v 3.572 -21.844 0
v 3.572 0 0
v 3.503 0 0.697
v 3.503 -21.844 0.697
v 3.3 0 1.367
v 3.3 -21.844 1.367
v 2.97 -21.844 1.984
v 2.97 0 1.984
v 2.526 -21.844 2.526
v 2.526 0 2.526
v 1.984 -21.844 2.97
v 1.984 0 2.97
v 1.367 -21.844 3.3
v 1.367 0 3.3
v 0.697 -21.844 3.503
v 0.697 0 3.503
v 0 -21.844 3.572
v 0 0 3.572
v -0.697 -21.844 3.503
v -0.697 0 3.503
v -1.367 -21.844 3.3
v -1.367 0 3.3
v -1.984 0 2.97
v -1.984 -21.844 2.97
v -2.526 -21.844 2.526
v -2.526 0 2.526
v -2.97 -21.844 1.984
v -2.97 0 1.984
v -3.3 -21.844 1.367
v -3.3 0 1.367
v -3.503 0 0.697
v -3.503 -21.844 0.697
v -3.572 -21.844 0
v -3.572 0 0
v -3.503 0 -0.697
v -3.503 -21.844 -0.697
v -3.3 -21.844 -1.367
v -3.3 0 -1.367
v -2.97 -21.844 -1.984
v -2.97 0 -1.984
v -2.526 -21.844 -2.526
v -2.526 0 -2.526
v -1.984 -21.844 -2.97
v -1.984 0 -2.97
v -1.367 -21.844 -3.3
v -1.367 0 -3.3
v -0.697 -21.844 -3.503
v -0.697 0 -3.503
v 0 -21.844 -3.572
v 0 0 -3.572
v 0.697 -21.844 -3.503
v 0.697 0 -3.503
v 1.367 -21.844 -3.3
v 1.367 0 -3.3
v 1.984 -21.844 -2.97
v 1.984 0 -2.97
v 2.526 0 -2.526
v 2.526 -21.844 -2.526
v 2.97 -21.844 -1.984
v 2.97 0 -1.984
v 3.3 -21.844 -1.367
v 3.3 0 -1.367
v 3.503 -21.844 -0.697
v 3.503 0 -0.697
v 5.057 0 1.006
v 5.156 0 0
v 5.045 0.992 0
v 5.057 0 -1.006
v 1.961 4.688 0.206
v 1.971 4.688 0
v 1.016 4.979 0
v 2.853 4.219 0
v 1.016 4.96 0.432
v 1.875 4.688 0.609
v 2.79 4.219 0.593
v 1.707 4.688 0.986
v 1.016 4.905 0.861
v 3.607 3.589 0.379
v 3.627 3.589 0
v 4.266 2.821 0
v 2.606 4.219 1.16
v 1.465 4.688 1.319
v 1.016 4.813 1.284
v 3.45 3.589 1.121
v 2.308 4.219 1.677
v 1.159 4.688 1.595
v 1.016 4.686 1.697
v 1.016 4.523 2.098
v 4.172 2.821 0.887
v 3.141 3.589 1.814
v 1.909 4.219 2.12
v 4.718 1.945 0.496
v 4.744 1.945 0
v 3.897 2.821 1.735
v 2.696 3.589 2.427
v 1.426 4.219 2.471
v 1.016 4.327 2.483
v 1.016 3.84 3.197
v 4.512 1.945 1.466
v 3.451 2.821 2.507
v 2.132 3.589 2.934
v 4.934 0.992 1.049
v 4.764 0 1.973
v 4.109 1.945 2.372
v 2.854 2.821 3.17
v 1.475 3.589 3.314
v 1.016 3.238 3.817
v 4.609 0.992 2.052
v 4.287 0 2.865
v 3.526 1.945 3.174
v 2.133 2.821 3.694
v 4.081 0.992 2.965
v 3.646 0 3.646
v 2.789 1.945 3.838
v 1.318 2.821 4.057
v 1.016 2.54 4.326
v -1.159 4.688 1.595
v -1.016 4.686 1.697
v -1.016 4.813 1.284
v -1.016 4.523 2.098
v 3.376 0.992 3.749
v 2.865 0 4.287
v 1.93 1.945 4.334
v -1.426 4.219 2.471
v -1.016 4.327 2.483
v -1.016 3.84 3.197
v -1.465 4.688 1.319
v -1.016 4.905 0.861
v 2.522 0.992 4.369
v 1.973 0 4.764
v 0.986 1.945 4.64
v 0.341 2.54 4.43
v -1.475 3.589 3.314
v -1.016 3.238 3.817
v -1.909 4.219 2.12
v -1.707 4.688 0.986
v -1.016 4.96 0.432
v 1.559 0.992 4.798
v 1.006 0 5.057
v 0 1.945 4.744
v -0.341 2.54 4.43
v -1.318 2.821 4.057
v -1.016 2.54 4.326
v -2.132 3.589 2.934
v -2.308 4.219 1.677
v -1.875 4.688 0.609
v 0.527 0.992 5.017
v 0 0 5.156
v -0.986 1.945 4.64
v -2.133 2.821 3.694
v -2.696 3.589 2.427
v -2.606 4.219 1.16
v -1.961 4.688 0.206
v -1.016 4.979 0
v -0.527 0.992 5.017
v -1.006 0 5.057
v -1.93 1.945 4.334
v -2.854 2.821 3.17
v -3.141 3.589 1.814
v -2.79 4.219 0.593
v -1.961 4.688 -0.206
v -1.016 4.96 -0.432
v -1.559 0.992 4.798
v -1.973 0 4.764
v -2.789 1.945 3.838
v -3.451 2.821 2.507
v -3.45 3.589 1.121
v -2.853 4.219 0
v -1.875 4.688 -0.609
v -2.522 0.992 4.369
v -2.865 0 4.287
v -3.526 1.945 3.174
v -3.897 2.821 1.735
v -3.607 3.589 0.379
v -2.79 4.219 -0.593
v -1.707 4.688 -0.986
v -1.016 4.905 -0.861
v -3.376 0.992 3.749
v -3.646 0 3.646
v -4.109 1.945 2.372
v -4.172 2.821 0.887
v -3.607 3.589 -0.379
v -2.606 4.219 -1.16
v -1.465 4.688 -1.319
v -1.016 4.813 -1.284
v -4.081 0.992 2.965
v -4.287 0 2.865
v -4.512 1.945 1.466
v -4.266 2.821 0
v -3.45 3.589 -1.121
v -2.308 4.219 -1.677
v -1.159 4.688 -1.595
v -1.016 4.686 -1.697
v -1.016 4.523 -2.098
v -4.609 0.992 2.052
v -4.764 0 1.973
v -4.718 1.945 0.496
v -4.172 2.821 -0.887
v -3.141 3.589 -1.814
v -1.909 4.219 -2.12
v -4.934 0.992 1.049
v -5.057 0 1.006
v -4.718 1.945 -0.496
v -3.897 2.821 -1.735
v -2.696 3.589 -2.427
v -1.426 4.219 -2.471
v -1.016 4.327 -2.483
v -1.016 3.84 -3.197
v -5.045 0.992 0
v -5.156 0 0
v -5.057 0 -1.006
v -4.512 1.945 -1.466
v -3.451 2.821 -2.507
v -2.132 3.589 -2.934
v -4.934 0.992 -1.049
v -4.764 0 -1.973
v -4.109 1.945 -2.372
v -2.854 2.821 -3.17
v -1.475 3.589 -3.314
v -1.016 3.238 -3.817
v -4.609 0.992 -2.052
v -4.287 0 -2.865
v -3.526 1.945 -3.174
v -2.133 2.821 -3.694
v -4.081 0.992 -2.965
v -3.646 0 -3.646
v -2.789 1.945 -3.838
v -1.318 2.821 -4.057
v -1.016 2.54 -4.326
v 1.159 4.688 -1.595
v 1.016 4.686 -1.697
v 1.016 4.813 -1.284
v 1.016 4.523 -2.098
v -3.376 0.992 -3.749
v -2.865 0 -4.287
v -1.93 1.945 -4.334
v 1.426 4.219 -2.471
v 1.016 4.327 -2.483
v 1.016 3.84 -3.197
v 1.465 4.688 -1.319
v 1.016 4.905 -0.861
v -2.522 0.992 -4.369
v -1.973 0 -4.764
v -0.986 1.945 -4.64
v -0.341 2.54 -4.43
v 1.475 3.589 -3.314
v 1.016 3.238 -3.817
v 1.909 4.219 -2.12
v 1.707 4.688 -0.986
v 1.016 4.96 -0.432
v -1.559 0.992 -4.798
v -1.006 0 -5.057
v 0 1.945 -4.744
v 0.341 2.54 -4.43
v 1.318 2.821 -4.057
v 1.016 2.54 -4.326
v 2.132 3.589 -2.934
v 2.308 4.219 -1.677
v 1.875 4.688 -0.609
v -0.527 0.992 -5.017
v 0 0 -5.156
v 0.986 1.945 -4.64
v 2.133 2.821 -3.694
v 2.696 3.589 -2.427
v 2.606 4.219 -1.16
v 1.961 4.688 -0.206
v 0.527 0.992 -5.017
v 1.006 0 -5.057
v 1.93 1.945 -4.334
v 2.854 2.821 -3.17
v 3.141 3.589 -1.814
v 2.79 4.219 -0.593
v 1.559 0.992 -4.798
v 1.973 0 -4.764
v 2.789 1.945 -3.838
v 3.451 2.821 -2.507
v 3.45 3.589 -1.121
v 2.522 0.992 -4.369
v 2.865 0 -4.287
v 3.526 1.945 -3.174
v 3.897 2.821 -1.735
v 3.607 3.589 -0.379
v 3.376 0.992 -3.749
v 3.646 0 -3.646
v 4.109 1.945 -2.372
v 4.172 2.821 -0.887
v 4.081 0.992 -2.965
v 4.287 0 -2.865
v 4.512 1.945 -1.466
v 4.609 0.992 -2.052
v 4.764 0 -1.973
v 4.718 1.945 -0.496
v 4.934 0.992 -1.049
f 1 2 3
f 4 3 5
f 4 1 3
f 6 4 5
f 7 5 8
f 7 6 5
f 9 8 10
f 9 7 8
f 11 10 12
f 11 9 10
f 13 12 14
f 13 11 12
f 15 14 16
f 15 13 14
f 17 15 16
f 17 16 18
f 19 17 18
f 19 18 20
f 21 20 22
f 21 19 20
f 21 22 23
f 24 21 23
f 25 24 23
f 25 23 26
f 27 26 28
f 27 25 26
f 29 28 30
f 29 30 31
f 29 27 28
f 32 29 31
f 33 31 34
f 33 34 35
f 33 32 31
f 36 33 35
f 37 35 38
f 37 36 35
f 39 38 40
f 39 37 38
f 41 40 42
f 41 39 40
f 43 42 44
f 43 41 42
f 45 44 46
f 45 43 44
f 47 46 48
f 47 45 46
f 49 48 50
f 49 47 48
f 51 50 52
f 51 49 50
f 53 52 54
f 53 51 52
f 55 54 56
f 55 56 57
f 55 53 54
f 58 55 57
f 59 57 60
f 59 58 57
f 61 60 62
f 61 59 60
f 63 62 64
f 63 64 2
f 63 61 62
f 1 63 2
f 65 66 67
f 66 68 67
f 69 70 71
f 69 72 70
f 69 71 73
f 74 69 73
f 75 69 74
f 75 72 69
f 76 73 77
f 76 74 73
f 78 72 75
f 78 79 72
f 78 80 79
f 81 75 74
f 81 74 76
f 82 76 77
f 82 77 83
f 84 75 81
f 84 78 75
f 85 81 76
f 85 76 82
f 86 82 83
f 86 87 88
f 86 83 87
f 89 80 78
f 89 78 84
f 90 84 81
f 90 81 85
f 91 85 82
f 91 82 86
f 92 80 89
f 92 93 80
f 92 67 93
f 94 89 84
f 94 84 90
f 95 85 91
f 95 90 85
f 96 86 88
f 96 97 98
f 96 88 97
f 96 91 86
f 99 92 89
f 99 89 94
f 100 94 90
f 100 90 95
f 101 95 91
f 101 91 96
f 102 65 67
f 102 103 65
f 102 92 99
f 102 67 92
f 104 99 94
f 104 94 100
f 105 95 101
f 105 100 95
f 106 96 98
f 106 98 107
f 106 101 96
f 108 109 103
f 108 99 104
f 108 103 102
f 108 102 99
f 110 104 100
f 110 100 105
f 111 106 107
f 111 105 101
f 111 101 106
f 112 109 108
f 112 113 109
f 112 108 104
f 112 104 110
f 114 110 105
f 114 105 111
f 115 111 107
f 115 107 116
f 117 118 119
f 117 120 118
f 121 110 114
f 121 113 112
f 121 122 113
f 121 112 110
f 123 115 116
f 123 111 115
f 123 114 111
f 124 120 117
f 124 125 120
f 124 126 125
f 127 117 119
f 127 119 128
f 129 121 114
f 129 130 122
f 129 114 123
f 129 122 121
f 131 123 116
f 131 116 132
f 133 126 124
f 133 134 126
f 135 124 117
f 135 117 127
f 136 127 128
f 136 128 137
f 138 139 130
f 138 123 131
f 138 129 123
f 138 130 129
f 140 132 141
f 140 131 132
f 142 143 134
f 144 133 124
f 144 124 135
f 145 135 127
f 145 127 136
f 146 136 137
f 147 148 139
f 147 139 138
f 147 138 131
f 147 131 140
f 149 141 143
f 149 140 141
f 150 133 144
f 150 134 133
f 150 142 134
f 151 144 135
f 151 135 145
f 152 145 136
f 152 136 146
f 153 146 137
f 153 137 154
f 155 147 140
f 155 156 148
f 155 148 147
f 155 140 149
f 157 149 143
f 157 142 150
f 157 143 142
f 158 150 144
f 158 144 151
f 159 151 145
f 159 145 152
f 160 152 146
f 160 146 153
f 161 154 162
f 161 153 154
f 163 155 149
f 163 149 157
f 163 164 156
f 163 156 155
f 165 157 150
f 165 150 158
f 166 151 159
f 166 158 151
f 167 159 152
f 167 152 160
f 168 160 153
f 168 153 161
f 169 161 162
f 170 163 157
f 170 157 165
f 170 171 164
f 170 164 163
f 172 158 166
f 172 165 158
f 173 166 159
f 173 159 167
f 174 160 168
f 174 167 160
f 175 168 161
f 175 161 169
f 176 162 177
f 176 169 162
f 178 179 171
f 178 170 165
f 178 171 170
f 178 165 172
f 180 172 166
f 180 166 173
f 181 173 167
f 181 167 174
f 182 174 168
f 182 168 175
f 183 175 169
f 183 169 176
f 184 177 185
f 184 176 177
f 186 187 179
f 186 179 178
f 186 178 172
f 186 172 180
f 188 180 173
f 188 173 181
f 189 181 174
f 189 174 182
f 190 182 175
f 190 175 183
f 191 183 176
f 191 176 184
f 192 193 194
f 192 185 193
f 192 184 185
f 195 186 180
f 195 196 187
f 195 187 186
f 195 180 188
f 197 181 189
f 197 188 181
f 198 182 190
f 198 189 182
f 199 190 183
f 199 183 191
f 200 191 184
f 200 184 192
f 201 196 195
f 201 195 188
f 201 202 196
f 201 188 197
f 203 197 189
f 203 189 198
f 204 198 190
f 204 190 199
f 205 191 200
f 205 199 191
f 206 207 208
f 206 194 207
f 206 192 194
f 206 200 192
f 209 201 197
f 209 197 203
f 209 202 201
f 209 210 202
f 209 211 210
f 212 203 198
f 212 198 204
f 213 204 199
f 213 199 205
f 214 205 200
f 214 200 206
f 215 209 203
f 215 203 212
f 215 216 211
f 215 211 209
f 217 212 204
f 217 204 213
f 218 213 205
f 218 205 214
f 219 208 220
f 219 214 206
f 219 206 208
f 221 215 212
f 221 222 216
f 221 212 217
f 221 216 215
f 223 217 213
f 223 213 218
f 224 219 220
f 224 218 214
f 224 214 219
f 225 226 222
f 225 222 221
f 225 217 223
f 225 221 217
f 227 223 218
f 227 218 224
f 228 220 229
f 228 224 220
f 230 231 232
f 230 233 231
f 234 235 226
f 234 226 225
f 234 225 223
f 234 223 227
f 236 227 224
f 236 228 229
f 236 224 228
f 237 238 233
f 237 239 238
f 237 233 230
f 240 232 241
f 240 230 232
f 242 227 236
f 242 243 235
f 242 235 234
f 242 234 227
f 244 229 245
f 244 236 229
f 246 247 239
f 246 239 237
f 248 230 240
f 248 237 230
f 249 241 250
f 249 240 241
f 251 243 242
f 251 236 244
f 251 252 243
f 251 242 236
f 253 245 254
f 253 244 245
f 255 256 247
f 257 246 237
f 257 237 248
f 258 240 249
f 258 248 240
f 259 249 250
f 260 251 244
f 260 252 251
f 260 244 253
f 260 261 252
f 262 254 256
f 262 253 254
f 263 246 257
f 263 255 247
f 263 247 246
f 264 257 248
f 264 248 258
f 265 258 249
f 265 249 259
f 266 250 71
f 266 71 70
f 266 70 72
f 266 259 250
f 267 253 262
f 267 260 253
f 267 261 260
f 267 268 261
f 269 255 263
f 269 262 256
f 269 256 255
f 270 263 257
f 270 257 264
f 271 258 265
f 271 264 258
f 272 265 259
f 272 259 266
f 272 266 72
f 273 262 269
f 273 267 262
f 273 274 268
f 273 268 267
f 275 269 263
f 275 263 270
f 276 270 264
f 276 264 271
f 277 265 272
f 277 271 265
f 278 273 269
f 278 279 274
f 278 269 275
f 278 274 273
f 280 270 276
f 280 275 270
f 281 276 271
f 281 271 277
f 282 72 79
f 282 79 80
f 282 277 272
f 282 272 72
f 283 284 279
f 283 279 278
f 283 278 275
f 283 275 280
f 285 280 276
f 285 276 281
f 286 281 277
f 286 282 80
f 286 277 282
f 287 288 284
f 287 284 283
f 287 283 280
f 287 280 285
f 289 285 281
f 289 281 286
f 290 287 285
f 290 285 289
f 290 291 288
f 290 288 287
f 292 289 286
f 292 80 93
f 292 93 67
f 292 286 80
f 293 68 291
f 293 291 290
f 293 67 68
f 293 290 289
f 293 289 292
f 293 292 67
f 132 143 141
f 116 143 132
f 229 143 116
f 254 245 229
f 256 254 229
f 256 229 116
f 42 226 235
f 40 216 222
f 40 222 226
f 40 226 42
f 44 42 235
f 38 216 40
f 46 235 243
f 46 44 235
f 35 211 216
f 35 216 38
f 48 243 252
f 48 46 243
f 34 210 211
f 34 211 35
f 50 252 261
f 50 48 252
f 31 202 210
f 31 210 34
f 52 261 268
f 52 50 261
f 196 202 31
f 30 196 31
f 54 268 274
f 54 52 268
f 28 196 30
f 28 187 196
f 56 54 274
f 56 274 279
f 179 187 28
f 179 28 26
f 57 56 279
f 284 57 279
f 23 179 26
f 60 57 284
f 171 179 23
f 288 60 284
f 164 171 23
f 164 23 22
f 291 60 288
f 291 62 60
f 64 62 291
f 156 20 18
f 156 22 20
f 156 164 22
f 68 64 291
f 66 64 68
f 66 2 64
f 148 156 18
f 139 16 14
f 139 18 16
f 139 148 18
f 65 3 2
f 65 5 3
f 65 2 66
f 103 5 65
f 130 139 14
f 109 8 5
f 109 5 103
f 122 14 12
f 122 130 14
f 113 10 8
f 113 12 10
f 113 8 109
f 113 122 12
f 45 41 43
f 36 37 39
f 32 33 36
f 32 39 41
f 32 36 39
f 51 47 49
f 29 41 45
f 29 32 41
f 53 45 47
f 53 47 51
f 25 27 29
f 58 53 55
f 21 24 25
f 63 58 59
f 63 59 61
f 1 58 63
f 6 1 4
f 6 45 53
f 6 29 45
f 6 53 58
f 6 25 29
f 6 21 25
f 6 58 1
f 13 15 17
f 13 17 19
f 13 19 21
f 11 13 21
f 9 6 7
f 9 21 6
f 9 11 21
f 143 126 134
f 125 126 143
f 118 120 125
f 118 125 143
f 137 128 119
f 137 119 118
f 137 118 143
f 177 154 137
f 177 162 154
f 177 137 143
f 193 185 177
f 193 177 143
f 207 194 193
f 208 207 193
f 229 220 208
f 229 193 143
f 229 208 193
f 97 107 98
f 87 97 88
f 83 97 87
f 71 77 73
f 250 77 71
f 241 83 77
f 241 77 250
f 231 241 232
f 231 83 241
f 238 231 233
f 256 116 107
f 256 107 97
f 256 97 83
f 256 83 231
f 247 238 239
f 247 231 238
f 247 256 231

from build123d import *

# Parameters (mm, degrees)
CUT_EXTRUDE1_DEPTH      = 24.028962914
CUT_EXTRUDE1_DEPTH_BACK = 24.028962914


with BuildPart() as part:
    # Sketch1 → Base-Revolve (revolve)
    with BuildSketch(Plane.XY):
        with BuildLine():
            Line((5.1562, 0), (3.571875, 0))
            Line((3.571875, 0), (3.571875, -21.844))
            Line((3.571875, -21.844), (0, -21.844))
            Line((0, -21.844), (0, 5.08))
            ThreePointArc((0, 5.08), (3.619143491, 3.596659144), (5.1562, 0))
        make_face()
    revolve(axis=Axis((0, 10.110523875, 0), (0, -1, 0)))

    # Sketch2 → Cut-Extrude1 (cut, two sides: drawn at the far end of the back side and taken through both)
    with BuildSketch(Plane.XY.offset(-CUT_EXTRUDE1_DEPTH_BACK)):
        with BuildLine():
            Line((-1.016, 4.978921954), (-1.016, 2.54))
            Line((-1.016, 2.54), (1.016, 2.54))
            Line((1.016, 2.54), (1.016, 4.978921954))
            ThreePointArc((1.016, 4.978921954), (0, 5.08), (-1.016, 4.978921954))
        make_face()
    extrude(amount=CUT_EXTRUDE1_DEPTH + CUT_EXTRUDE1_DEPTH_BACK, mode=Mode.SUBTRACT)


solid = part.part
